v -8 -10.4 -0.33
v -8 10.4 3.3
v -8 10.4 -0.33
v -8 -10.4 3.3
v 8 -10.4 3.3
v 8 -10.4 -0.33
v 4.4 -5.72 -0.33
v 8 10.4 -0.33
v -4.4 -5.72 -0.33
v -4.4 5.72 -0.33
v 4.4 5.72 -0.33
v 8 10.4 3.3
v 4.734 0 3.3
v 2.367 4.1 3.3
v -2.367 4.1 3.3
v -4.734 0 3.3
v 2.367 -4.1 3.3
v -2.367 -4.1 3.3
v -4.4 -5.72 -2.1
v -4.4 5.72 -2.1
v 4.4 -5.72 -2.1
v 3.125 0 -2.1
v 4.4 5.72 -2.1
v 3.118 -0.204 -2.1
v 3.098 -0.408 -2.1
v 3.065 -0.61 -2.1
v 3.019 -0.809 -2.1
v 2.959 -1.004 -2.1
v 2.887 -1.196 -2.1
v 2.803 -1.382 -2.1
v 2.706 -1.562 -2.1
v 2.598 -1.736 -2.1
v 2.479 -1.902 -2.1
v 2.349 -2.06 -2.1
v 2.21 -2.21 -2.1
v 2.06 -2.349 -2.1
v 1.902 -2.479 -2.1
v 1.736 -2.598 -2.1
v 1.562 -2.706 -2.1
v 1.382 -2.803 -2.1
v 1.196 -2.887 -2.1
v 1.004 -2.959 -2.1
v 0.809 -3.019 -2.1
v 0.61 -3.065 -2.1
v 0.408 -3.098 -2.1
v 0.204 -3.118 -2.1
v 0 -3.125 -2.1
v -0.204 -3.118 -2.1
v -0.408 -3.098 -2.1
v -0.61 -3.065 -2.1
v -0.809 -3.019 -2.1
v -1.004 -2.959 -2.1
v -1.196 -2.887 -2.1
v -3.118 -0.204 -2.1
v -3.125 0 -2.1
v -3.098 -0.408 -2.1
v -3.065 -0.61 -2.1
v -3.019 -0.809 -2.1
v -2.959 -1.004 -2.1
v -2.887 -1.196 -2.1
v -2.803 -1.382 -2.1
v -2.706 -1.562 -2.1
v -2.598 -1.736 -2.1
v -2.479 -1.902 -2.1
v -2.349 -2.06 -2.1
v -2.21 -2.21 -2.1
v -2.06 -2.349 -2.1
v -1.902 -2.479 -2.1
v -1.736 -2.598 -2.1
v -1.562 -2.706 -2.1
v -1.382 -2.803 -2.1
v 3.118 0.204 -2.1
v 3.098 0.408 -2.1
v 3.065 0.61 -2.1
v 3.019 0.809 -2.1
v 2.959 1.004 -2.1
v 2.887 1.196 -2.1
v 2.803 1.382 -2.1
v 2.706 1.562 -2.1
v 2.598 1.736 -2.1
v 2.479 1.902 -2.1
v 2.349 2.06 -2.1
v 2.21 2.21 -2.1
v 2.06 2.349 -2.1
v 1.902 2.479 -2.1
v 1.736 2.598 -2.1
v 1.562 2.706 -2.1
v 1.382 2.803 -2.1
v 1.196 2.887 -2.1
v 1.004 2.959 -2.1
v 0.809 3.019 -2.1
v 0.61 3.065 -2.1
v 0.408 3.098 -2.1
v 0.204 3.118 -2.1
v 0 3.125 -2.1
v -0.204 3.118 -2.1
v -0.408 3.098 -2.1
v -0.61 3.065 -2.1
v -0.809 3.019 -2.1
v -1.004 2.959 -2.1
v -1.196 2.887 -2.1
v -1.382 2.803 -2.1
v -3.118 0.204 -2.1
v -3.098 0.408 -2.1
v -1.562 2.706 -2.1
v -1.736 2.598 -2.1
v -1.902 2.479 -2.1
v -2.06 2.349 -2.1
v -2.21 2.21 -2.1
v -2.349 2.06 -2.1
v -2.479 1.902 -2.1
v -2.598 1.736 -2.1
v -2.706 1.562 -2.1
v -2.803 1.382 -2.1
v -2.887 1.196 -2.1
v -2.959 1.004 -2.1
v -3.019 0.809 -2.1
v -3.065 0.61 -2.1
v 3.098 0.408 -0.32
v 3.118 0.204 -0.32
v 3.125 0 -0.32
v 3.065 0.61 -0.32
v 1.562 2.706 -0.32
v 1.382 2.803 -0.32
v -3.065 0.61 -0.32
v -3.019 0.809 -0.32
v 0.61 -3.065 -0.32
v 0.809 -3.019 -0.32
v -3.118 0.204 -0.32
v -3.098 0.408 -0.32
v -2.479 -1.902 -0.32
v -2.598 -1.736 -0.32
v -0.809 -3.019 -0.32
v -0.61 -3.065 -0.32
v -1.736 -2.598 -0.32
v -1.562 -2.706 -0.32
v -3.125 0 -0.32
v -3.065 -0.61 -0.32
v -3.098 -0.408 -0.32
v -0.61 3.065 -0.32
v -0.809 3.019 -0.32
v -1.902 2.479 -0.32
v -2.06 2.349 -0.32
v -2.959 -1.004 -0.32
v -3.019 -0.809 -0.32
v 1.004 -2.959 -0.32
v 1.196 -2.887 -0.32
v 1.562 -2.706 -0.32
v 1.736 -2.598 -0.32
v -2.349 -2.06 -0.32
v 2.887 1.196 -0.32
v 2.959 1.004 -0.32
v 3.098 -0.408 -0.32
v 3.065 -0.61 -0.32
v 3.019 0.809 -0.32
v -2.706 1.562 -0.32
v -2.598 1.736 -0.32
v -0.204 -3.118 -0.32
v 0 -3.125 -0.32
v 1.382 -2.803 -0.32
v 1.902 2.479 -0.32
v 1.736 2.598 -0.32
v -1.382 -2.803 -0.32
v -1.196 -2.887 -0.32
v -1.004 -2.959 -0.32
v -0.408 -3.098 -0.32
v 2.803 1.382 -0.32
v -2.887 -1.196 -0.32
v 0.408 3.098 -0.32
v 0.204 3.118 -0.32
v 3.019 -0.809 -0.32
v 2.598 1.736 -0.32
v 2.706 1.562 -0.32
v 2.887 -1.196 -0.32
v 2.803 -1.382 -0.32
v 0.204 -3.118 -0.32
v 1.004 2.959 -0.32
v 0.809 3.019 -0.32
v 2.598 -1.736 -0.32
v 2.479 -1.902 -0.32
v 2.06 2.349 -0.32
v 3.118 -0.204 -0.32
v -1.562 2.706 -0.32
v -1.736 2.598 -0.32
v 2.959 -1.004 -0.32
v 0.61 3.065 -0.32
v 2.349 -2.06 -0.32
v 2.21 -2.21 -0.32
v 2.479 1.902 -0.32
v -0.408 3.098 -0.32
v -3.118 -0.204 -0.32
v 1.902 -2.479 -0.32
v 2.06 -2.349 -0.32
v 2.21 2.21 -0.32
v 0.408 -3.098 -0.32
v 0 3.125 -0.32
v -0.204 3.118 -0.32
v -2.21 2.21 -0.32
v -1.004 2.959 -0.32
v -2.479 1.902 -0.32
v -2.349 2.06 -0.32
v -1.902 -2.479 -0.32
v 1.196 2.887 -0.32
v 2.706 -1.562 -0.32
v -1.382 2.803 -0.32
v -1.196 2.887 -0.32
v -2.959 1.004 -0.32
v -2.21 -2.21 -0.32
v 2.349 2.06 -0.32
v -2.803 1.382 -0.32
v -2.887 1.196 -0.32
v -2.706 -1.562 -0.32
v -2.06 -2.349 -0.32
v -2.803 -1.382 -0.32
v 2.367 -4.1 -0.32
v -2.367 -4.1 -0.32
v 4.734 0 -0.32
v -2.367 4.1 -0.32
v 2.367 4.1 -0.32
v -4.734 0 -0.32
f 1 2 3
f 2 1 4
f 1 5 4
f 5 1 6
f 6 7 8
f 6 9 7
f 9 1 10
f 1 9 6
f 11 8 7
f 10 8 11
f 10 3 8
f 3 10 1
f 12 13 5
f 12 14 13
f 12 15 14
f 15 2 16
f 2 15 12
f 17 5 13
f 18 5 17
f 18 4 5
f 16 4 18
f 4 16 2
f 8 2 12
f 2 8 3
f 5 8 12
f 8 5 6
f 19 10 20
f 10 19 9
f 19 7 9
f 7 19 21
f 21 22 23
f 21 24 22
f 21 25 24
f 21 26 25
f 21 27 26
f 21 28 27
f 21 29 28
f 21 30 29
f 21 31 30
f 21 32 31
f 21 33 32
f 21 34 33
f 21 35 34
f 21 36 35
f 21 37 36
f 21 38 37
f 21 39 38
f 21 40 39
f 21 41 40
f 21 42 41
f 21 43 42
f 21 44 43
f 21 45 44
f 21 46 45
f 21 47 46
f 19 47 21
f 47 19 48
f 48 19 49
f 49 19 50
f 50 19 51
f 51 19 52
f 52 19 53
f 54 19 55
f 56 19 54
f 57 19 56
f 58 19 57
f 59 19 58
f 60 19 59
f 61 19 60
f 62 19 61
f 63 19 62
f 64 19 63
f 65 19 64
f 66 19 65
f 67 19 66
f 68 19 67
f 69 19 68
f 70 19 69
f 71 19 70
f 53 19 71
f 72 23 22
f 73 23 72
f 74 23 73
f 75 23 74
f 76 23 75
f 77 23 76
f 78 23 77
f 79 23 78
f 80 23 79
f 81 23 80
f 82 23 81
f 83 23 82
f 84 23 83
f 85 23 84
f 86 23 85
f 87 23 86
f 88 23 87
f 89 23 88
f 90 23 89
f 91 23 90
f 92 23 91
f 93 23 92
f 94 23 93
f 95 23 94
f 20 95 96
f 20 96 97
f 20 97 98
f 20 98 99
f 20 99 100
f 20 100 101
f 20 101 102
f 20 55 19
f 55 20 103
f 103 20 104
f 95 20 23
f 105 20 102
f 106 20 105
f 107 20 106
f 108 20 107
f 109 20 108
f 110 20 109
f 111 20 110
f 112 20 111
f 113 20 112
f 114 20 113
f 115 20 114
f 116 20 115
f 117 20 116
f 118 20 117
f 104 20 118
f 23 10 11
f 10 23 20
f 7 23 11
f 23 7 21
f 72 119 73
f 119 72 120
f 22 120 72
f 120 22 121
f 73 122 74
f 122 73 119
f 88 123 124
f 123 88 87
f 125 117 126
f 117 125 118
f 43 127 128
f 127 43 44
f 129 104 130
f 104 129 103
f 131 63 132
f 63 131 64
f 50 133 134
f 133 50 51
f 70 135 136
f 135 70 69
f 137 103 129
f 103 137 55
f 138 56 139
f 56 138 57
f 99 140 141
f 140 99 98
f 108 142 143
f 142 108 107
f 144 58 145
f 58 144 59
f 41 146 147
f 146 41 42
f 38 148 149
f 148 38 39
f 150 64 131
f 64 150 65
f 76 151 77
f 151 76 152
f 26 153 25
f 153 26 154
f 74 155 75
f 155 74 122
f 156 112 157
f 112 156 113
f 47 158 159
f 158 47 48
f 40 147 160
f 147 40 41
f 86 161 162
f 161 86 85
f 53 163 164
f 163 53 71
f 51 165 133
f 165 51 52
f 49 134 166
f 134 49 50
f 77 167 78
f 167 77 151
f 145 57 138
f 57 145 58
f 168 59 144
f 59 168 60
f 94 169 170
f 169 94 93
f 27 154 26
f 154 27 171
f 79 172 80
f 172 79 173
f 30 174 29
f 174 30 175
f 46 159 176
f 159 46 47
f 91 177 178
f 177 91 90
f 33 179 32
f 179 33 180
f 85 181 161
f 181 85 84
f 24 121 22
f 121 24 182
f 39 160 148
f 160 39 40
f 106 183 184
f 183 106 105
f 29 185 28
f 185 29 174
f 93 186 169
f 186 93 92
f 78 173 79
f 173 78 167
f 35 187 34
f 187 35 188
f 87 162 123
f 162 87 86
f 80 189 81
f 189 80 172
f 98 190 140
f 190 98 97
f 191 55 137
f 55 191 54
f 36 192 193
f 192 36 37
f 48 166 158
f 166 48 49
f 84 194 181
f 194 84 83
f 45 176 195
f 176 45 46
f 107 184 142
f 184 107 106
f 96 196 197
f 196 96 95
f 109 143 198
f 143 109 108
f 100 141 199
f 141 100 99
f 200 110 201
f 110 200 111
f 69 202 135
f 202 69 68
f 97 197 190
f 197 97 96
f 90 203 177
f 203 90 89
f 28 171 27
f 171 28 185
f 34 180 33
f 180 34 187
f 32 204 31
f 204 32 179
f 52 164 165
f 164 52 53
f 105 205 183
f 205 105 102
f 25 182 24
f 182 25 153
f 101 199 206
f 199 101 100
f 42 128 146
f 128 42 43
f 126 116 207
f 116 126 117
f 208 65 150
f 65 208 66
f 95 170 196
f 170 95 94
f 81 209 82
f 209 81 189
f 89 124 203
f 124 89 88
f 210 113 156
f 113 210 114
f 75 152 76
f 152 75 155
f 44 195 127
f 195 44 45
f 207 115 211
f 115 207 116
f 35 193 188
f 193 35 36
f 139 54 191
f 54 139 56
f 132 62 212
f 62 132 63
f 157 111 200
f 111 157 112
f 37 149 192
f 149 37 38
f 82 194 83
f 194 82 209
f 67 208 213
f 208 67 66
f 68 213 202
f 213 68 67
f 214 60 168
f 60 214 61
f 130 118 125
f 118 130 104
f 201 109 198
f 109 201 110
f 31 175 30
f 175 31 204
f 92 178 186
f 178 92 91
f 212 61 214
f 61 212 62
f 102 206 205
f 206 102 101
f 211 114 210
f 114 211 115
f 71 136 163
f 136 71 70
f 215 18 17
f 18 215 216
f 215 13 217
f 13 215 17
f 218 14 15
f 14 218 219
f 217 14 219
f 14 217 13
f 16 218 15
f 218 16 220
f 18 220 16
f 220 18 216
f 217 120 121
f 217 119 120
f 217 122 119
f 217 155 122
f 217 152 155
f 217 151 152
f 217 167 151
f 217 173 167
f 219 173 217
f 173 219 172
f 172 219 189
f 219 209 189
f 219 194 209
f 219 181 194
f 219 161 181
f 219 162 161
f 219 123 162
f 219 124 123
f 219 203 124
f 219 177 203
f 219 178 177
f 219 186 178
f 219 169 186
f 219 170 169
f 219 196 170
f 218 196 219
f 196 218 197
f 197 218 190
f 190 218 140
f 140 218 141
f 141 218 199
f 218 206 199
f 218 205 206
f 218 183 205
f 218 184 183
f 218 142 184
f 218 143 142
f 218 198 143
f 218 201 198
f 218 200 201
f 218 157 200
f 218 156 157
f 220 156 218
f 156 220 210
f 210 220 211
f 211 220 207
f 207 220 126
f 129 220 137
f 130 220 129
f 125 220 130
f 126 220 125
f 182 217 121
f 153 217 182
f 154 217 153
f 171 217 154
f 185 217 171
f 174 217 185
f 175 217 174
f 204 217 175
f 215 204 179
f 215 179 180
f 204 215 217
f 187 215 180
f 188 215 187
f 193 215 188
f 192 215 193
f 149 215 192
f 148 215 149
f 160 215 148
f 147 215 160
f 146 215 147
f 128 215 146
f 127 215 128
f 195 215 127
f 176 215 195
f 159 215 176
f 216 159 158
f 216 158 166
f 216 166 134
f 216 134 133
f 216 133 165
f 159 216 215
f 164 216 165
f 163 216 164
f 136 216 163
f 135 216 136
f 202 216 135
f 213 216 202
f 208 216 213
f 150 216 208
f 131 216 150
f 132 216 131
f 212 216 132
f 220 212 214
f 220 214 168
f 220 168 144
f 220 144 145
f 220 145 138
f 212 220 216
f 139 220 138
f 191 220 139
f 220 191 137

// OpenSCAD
$fn = 96;

// --- Required specs ---
screw_diameter     = 6.0;   // for 6.0mm screw
hex_across_flats   = 8.0;   // 8.0mm AF hex pocket
nut_thickness      = 6.6;   // total thickness (Z)

// --- Fit/print clearances ---
hole_clearance     = 0.25;  // clearance for screw shank
hex_clearance      = 0.20;  // clearance for hex pocket
edge_chamfer       = 0.35;  // small edge break

// --- Connectivity overlap (must be 1-2mm) ---
overlap            = 1.2;   // overlap to guarantee connectivity

// --- Derived ---
hole_d = screw_diameter + hole_clearance;

// --- T-slot nut overall proportions ---
head_w = hex_across_flats * 2.0;   // wide part across X
head_l = hex_across_flats * 2.6;   // length along Y
stem_w = hex_across_flats * 1.1;   // narrower stem across X
stem_l = head_l * 0.55;            // shorter stem along Y

// Split thickness into head + stem heights (sum = nut_thickness)
stem_h = nut_thickness * 0.45;
head_h = nut_thickness - stem_h;

// Clamp overlap so it cannot exceed either section height
ov = min(overlap, stem_h*0.9, head_h*0.9);

// --- Helpers ---
module chamfered_box(size=[10,10,10], c=0.35) {
    x=size[0]; y=size[1]; z=size[2];
    c2 = min(c, x/4, y/4, z/4);
    hull() {
        for (sx=[-1,1], sy=[-1,1], sz=[-1,1])
            translate([sx*(x/2-c2), sy*(y/2-c2), sz*(z/2-c2)])
                cube([2*c2, 2*c2, 2*c2], center=true);
    }
}

// Regular hex prism sized by across-flats (AF)
module hex_prism_af(af=8, h=5, center=true) {
    // For a regular hex, AF = 2 * apothem; circumradius R = AF / sqrt(3)
    R = af / sqrt(3);
    cylinder(r=R, h=h, $fn=6, center=center);
}

module t_slot_nut() {
    difference() {
        union() {
            // Place head and stem so they INTERSECT by 'ov' (no floating parts).
            // Head bottom plane: z = +nut_thickness/2 - head_h
            // Stem top plane:   z = -nut_thickness/2 + stem_h
            // We shift stem upward by 'ov' so: stem_top = head_bottom + ov
            head_z = +nut_thickness/2 - head_h/2;
            stem_z = -nut_thickness/2 + stem_h/2 + ov;

            // Wide head (top portion)
            translate([0, 0, head_z])
                chamfered_box([head_w, head_l, head_h], edge_chamfer);

            // Narrow stem (bottom portion), fused to head with overlap
            translate([0, 0, stem_z])
                chamfered_box([stem_w, stem_l, stem_h], edge_chamfer);
        }

        // Through clearance hole for 6mm screw
        cylinder(d=hole_d, h=nut_thickness + 2, center=true);

        // Hex pocket (8mm AF) on the TOP face
        hex_depth = min(nut_thickness*0.55, nut_thickness - 1.2);
        translate([0, 0, +nut_thickness/2 - hex_depth/2 + 0.01])
            hex_prism_af(af=hex_across_flats + hex_clearance, h=hex_depth, center=true);

        // Small lead-in chamfer for the screw hole on both faces
        cham_h = edge_chamfer * 2;
        for (s=[-1,1])
            translate([0, 0, s*(nut_thickness/2 - cham_h/2 + 0.01)])
                cylinder(d1=hole_d + 2*edge_chamfer, d2=hole_d, h=cham_h, center=true);
    }
}

t_slot_nut();
